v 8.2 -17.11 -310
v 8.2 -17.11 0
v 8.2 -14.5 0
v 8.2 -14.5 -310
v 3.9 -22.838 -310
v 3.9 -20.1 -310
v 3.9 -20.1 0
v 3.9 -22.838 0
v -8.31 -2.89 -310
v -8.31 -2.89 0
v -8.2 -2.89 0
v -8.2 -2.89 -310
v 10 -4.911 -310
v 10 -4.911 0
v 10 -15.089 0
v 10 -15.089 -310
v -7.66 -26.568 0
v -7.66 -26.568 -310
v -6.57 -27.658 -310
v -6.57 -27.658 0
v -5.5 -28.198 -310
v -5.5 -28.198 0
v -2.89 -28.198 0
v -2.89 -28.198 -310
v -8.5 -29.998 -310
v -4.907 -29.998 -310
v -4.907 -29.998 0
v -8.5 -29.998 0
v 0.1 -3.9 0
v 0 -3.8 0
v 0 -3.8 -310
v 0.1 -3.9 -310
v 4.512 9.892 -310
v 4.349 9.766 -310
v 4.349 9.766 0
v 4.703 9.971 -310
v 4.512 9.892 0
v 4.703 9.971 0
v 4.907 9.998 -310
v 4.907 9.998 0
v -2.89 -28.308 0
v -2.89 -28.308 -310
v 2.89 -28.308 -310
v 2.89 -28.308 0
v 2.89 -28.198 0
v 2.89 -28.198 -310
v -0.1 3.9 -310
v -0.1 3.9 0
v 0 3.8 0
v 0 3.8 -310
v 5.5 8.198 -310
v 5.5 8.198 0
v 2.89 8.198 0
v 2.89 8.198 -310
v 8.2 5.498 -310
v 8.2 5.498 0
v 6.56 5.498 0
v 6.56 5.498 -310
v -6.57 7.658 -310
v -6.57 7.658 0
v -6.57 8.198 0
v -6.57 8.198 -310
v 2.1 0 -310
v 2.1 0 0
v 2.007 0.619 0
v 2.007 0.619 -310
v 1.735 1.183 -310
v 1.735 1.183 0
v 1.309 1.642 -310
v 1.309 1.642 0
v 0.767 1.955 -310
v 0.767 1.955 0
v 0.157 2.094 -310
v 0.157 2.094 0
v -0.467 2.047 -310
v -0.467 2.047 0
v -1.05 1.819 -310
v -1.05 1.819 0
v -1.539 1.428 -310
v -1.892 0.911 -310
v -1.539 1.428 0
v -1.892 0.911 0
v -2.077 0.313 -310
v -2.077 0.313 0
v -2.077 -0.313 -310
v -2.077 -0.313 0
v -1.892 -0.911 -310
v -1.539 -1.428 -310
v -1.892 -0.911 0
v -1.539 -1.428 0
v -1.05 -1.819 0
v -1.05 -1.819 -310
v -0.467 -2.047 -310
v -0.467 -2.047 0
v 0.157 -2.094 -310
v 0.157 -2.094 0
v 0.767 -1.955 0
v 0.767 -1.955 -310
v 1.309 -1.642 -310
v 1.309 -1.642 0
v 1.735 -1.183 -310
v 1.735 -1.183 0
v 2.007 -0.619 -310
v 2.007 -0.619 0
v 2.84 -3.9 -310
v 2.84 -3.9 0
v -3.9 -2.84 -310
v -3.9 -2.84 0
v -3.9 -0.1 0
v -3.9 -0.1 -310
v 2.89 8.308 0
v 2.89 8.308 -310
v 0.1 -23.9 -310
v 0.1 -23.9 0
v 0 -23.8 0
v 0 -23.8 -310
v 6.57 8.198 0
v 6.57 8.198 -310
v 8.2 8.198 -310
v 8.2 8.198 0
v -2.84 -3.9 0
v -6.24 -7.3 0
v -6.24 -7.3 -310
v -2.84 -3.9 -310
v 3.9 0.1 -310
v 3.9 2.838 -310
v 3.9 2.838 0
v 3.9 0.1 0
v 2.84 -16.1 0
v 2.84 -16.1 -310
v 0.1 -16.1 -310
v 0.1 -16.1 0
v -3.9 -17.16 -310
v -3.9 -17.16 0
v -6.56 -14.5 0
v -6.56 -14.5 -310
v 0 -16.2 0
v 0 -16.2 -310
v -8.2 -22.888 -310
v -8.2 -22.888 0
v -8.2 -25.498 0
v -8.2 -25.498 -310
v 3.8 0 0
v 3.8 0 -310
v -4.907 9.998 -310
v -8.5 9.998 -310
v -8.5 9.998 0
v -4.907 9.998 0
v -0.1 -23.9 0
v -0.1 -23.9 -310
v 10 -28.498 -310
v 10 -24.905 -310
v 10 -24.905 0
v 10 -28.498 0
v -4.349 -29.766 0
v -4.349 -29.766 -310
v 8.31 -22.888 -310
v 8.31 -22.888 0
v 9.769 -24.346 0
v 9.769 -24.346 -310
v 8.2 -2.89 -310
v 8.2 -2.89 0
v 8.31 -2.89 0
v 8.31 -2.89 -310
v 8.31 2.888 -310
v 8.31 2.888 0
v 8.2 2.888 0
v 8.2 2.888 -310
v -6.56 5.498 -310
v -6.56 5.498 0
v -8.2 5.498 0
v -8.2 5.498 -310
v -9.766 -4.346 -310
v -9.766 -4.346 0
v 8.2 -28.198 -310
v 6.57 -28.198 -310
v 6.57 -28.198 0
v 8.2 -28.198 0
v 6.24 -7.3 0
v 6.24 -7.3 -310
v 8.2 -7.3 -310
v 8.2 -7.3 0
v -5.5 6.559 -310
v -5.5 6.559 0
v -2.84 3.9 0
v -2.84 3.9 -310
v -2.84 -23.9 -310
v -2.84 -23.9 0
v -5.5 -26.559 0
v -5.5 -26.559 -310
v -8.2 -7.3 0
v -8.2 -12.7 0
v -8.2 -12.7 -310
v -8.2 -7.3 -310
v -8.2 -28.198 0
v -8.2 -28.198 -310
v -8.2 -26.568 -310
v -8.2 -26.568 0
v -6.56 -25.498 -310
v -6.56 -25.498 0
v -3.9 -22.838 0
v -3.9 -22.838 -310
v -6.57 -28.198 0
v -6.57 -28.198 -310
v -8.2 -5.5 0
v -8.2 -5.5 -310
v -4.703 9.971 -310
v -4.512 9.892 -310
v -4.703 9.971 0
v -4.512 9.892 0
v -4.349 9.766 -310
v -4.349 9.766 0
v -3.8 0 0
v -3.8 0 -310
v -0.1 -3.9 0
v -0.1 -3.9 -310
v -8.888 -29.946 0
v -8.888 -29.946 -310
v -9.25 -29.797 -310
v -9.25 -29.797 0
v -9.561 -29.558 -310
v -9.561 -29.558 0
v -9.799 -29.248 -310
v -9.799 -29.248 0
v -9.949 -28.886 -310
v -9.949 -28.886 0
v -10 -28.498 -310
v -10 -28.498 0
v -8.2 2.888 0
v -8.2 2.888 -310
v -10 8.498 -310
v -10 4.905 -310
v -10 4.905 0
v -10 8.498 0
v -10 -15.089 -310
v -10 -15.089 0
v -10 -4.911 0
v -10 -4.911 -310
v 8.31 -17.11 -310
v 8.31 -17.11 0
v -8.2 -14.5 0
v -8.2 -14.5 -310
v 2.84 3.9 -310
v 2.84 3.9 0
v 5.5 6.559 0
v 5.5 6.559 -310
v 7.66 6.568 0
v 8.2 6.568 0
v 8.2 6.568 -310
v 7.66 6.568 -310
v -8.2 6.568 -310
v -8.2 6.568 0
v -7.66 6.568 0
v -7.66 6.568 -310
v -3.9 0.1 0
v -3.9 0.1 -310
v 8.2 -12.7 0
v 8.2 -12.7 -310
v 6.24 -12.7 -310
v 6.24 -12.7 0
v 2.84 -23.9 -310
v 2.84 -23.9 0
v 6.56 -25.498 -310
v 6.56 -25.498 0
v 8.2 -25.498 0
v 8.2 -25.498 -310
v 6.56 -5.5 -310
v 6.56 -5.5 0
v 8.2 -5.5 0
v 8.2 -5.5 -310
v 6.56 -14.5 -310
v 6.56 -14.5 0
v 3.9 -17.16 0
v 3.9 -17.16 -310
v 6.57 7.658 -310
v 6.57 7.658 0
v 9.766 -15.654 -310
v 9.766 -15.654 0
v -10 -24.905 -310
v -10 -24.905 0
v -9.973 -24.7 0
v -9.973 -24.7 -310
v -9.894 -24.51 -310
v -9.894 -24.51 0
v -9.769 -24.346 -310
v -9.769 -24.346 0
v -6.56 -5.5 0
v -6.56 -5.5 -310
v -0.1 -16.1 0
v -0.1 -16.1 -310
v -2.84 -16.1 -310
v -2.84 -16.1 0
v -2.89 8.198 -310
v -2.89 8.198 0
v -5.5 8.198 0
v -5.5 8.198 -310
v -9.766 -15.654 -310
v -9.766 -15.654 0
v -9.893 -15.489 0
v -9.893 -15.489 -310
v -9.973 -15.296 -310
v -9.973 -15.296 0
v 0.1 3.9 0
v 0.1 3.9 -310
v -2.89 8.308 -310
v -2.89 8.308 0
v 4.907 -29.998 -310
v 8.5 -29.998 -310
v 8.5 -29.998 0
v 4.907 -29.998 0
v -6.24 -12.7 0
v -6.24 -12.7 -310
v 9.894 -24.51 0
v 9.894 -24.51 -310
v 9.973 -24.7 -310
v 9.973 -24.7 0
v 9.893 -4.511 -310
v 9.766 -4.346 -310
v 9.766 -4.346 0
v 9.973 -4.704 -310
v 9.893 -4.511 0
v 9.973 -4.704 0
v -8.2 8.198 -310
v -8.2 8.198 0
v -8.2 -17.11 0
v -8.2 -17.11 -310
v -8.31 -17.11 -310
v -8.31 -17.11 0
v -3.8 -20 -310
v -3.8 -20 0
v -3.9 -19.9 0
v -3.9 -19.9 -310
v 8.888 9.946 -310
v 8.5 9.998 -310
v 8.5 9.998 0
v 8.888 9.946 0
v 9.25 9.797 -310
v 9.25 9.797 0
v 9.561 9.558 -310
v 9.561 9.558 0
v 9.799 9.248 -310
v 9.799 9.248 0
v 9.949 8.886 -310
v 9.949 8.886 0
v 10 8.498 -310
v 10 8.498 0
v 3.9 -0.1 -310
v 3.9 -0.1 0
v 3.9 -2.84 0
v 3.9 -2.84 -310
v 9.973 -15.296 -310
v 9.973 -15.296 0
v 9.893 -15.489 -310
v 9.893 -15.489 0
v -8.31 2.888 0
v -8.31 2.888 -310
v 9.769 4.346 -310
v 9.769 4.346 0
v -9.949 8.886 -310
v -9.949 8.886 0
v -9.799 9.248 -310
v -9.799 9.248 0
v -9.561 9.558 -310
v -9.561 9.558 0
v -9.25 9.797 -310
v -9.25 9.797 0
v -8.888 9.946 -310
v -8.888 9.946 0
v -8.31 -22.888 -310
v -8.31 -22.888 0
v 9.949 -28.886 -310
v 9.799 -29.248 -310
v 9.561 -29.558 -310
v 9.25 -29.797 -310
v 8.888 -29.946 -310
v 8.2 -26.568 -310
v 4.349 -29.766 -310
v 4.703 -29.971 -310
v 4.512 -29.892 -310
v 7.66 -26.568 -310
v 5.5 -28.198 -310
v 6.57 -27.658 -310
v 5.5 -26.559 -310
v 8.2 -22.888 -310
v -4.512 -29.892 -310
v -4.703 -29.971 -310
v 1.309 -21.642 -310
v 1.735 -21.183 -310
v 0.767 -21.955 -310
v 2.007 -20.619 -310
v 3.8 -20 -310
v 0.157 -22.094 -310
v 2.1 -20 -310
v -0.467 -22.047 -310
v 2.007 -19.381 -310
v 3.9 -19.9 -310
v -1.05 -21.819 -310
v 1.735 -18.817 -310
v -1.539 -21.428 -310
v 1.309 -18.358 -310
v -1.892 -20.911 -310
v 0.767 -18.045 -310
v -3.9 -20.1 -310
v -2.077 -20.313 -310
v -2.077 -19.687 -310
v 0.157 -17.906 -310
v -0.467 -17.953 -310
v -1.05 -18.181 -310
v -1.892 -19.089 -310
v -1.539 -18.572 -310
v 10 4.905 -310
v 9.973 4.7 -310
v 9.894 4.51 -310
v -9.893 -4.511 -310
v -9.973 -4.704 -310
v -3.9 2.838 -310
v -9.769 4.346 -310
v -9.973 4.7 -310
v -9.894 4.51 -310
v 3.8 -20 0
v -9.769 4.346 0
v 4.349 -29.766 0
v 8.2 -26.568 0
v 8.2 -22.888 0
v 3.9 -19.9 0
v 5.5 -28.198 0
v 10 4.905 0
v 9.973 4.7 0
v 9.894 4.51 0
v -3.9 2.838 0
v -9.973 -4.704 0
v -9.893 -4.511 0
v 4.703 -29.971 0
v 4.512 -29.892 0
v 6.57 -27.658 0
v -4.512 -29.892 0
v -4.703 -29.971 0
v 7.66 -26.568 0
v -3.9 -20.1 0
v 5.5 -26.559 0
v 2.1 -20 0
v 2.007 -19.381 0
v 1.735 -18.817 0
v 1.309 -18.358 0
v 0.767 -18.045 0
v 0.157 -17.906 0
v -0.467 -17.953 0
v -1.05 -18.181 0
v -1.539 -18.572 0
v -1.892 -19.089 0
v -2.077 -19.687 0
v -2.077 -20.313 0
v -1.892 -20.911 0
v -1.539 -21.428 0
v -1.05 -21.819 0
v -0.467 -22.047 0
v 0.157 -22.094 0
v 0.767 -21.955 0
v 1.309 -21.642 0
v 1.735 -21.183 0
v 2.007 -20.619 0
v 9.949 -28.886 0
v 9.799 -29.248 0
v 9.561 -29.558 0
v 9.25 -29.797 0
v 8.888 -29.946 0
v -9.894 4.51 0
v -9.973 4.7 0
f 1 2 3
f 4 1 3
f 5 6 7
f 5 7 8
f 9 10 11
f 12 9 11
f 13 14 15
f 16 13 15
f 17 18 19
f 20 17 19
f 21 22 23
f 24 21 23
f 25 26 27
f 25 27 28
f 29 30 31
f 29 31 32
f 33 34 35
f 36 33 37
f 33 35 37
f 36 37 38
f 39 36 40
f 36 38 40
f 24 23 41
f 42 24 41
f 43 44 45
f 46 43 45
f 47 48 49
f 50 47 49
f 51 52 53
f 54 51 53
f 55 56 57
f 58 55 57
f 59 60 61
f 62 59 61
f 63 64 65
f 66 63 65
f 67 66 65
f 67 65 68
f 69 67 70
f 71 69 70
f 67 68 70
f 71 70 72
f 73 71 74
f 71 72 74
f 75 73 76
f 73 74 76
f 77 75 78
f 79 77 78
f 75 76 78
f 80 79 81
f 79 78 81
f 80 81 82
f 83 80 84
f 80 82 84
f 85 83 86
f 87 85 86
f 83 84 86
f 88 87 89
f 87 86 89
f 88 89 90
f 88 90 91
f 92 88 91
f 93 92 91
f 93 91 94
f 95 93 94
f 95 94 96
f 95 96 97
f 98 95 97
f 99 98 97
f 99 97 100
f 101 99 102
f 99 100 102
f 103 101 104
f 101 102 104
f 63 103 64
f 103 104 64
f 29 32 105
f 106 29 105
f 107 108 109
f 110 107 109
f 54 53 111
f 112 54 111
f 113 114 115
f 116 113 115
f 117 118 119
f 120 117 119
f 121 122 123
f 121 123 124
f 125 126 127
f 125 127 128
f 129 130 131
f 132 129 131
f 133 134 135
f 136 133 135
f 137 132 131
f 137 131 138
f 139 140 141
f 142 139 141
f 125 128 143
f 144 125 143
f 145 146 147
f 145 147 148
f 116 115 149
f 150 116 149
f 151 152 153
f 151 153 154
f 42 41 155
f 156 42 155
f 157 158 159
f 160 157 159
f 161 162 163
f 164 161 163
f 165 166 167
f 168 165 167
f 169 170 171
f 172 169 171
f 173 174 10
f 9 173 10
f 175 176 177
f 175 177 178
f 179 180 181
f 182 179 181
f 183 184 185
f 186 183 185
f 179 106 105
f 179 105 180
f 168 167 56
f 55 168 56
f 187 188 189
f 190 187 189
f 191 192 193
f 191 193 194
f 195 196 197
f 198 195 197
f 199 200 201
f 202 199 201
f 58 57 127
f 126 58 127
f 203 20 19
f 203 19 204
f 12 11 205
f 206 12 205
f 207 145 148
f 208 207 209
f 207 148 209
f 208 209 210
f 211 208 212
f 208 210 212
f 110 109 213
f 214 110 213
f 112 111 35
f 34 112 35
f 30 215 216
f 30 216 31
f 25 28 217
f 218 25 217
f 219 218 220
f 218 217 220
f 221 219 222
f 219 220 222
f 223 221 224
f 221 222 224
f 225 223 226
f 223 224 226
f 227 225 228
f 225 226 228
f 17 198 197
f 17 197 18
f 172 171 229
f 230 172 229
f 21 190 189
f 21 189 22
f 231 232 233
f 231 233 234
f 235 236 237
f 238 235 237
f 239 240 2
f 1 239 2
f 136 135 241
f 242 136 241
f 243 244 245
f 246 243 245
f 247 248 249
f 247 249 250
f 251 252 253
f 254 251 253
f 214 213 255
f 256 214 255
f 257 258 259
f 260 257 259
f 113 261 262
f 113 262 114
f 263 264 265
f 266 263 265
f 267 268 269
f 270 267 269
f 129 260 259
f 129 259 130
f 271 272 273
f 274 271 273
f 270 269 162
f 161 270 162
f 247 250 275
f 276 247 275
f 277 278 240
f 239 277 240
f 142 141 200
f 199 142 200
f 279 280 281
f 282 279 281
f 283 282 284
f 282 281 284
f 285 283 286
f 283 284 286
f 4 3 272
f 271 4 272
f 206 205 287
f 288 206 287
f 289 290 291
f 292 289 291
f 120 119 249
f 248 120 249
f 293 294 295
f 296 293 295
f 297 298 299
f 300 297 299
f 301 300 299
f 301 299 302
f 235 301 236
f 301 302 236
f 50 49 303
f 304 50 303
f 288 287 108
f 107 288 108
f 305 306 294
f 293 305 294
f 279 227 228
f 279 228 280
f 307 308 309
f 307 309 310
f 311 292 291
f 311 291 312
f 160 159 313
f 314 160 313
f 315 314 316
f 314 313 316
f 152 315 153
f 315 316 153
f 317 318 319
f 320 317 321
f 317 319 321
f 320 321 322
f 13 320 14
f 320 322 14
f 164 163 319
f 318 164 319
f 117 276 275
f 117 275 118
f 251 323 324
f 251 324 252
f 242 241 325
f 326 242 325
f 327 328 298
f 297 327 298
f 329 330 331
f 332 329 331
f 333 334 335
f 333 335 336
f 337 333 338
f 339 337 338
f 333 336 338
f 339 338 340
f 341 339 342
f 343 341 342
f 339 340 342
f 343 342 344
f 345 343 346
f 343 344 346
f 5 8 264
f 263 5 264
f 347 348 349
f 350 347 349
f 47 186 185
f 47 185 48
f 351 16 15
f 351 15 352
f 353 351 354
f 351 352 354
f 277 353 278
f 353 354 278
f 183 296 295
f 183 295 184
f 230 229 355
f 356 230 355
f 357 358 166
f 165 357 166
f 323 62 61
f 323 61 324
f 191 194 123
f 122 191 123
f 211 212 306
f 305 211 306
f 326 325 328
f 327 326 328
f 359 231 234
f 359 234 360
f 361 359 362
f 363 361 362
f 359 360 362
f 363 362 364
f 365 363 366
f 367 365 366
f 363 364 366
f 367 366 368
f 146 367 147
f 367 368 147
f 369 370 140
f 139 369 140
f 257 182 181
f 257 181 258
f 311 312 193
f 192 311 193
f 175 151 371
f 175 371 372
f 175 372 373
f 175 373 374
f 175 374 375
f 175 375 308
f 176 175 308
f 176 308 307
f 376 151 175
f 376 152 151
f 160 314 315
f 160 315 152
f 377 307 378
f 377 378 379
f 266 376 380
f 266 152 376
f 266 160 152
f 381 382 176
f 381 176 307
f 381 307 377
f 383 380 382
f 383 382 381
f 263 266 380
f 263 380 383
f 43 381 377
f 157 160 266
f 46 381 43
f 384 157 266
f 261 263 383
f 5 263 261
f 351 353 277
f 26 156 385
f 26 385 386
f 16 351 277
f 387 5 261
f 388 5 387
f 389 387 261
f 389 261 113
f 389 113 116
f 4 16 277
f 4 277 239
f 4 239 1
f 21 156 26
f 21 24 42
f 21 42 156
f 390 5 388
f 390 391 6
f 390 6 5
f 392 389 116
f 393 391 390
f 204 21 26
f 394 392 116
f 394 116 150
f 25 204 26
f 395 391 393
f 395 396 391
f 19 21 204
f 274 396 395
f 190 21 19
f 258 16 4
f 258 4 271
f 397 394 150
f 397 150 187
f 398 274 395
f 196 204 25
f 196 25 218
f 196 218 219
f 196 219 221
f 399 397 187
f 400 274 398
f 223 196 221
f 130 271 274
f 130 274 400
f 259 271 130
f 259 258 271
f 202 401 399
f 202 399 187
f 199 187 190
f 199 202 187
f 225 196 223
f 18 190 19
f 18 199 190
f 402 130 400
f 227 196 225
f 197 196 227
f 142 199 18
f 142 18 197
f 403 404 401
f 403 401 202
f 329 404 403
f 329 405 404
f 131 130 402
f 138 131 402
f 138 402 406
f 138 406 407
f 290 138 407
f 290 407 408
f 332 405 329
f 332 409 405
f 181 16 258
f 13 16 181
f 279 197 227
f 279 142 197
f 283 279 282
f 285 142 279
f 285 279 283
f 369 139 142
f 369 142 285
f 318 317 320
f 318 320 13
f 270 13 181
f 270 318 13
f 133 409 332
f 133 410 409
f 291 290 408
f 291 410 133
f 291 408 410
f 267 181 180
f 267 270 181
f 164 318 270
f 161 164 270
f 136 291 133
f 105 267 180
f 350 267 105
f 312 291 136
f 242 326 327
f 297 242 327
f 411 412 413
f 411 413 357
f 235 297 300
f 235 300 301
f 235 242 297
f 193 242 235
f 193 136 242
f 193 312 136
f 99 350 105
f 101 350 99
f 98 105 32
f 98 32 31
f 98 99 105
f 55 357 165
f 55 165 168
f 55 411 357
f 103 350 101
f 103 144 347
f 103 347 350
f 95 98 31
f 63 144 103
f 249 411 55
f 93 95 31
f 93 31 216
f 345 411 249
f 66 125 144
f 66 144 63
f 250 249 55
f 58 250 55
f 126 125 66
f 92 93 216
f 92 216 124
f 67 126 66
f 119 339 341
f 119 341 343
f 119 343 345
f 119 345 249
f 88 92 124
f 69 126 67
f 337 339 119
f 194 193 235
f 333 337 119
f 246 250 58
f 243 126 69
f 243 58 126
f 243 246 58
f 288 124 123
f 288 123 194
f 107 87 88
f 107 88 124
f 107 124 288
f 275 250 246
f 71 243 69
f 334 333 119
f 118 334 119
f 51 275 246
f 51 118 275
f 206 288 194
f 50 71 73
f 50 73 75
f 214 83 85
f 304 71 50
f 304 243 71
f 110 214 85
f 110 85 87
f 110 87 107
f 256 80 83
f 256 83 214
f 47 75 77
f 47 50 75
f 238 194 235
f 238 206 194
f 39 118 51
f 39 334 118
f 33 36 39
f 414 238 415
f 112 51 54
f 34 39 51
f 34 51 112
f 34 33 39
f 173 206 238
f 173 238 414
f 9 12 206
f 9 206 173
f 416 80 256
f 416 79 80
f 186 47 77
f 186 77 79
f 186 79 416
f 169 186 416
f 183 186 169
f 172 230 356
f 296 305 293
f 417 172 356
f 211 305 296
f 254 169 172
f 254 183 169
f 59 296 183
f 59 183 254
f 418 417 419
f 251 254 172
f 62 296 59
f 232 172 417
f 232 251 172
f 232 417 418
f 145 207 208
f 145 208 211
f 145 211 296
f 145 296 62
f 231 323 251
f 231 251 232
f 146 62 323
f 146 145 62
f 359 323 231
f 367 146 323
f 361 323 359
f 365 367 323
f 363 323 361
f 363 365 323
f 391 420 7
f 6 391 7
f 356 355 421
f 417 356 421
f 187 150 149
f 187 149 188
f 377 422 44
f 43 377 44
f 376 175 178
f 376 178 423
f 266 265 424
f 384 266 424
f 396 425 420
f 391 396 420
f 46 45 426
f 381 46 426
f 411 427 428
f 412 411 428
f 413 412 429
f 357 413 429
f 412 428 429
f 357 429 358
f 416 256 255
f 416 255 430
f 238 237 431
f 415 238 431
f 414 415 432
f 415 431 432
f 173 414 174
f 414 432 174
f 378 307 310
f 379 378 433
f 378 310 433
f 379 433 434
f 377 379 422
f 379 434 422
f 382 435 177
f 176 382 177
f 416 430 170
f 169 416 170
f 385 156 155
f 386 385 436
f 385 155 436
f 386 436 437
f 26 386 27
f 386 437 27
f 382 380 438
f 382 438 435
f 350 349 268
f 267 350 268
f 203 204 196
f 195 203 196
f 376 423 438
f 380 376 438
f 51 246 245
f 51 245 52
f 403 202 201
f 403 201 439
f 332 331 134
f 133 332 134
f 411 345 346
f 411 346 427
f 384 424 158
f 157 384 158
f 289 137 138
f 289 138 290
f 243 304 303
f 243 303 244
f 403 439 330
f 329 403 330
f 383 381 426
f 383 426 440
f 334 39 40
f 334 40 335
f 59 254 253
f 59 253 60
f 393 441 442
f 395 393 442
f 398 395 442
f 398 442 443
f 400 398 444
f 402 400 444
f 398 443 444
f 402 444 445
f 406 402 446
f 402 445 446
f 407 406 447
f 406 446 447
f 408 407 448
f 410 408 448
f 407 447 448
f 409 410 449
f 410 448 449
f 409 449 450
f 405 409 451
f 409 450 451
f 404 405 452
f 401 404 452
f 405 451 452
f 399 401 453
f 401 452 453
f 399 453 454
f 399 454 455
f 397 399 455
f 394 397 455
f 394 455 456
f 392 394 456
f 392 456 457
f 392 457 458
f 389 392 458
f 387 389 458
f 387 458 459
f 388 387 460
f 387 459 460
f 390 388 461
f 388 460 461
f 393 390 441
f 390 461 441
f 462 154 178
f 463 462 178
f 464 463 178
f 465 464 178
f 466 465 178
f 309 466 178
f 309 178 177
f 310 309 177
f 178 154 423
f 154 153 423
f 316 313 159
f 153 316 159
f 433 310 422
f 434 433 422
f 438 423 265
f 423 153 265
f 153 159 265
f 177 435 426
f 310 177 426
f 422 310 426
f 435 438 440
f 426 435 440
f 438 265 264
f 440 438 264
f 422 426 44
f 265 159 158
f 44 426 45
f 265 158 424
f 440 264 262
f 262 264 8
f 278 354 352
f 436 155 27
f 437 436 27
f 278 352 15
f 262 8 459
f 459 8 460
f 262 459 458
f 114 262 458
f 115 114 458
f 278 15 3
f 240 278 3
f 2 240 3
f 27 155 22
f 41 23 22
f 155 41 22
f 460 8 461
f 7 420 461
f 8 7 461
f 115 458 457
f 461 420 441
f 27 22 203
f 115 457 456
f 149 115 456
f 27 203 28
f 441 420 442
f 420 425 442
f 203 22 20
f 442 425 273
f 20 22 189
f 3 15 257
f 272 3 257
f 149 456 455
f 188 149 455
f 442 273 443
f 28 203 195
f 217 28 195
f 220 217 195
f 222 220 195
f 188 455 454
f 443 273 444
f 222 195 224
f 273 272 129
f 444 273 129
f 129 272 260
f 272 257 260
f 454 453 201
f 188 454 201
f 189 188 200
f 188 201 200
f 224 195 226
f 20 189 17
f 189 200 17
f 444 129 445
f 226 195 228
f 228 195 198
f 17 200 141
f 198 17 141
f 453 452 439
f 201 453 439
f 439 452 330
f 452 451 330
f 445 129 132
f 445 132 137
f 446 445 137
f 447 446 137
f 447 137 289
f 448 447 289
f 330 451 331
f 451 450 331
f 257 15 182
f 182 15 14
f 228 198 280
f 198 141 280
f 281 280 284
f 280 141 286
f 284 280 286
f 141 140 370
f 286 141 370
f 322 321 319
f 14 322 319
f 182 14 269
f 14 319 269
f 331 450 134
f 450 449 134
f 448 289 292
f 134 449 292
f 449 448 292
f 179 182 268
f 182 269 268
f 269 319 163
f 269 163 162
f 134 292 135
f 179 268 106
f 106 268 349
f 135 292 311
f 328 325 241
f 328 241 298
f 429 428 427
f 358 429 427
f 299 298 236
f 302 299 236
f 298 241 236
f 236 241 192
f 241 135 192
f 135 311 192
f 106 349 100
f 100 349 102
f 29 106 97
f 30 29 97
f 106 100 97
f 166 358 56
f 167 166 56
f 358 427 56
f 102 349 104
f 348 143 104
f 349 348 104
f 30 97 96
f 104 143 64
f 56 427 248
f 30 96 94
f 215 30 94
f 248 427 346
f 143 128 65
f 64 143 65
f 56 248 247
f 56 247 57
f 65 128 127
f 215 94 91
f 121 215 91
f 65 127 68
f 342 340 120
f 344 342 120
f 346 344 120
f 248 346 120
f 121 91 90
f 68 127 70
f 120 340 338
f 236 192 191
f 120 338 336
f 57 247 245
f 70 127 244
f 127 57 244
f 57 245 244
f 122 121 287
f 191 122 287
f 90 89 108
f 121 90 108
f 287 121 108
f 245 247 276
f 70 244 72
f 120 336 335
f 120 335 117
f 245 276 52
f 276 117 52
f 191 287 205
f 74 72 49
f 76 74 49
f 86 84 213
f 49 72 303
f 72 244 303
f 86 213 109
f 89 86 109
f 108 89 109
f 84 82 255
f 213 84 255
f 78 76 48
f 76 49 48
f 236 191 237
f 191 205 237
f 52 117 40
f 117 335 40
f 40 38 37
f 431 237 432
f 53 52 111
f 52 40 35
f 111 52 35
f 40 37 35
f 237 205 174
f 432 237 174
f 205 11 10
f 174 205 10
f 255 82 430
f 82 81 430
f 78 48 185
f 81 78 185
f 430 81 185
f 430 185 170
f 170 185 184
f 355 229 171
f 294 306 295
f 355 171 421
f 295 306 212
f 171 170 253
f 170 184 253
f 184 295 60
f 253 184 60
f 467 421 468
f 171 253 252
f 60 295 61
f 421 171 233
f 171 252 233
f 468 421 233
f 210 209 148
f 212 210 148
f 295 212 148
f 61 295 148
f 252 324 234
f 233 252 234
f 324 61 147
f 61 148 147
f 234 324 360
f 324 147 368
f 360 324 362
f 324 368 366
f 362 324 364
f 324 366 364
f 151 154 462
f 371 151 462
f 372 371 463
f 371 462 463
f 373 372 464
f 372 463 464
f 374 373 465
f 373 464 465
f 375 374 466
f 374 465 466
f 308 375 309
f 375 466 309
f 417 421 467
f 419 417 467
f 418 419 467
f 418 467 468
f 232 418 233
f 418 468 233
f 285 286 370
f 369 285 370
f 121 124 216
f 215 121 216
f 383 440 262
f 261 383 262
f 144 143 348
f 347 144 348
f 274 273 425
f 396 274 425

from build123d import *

# Parameters (mm, degrees)
SKETCH2_R           = 2.1
BOSS_EXTRUDE1_DEPTH = 310


with BuildPart() as part:
    # Sketch2 → Boss-Extrude1 (new body)
    with BuildSketch(Plane.XY):
        with BuildLine():
            Line((-0.1, 3.9), (0, 3.8))
            Line((0, 3.8), (0.1, 3.9))
            Line((0.1, 3.9), (2.840365134, 3.9))
            Line((2.840365134, 3.9), (5.5, 6.558825842))
            Line((5.5, 6.558825842), (5.5, 8.197505675))
            Line((5.5, 8.197505675), (2.89, 8.197505675))
            Line((2.89, 8.197505675), (2.89, 8.307505675))
            Line((2.89, 8.307505675), (4.348614357, 9.766120032))
            ThreePointArc((4.348614357, 9.766120032), (4.604908803, 9.937370505), (4.907228714, 9.997505675))
            Line((4.907228714, 9.997505675), (8.5, 9.997505675))
            ThreePointArc((8.5, 9.997505675), (9.560660172, 9.558165846), (10, 8.497505675))
            Line((10, 8.497505675), (10, 4.904734389))
            ThreePointArc((10, 4.904734389), (9.939864831, 4.602414477), (9.768614357, 4.346120032))
            Line((9.768614357, 4.346120032), (8.31, 2.887505675))
            Line((8.31, 2.887505675), (8.2, 2.887505675))
            Line((8.2, 2.887505675), (8.2, 5.497505675))
            Line((8.2, 5.497505675), (6.56, 5.497505675))
            Line((6.56, 5.497505675), (3.9, 2.83831481))
            Line((3.9, 2.83831481), (3.9, 0.1))
            Line((3.9, 0.1), (3.8, 0))
            Line((3.8, 0), (3.9, -0.1))
            Line((3.9, -0.1), (3.9, -2.84))
            Line((3.9, -2.84), (6.56, -5.5))
            Line((6.56, -5.5), (8.2, -5.5))
            Line((8.2, -5.5), (8.2, -2.89))
            Line((8.2, -2.89), (8.31, -2.89))
            Line((8.31, -2.89), (9.765685425, -4.345685425))
            ThreePointArc((9.765685425, -4.345685425), (9.939103626, -4.605224104), (10, -4.91137085))
            Line((10, -4.91137085), (10, -15.08862915))
            ThreePointArc((10, -15.08862915), (9.939103626, -15.394775896), (9.765685425, -15.654314575))
            Line((9.765685425, -15.654314575), (8.31, -17.11))
            Line((8.31, -17.11), (8.2, -17.11))
            Line((8.2, -17.11), (8.2, -14.5))
            Line((8.2, -14.5), (6.56, -14.5))
            Line((6.56, -14.5), (3.9, -17.16))
            Line((3.9, -17.16), (3.9, -19.9))
            Line((3.9, -19.9), (3.8, -20))
            Line((3.8, -20), (3.9, -20.1))
            Line((3.9, -20.1), (3.9, -22.83831481))
            Line((3.9, -22.83831481), (6.56, -25.497505675))
            Line((6.56, -25.497505675), (8.2, -25.497505675))
            Line((8.2, -25.497505675), (8.2, -22.887505675))
            Line((8.2, -22.887505675), (8.31, -22.887505675))
            Line((8.31, -22.887505675), (9.768614357, -24.346120032))
            ThreePointArc((9.768614357, -24.346120032), (9.939864831, -24.602414477), (10, -24.904734389))
            Line((10, -24.904734389), (10, -28.497505675))
            ThreePointArc((10, -28.497505675), (9.560660172, -29.558165846), (8.5, -29.997505675))
            Line((8.5, -29.997505675), (4.907228714, -29.997505675))
            ThreePointArc((4.907228714, -29.997505675), (4.604908803, -29.937370505), (4.348614357, -29.766120032))
            Line((4.348614357, -29.766120032), (2.89, -28.307505675))
            Line((2.89, -28.307505675), (2.89, -28.197505675))
            Line((2.89, -28.197505675), (5.5, -28.197505675))
            Line((5.5, -28.197505675), (5.5, -26.558825842))
            Line((5.5, -26.558825842), (2.840365134, -23.9))
            Line((2.840365134, -23.9), (0.1, -23.9))
            Line((0.1, -23.9), (0, -23.8))
            Line((0, -23.8), (-0.1, -23.9))
            Line((-0.1, -23.9), (-2.840365134, -23.9))
            Line((-2.840365134, -23.9), (-5.5, -26.558825842))
            Line((-5.5, -26.558825842), (-5.5, -28.197505675))
            Line((-5.5, -28.197505675), (-2.89, -28.197505675))
            Line((-2.89, -28.197505675), (-2.89, -28.307505675))
            Line((-2.89, -28.307505675), (-4.348614357, -29.766120032))
            ThreePointArc((-4.348614357, -29.766120032), (-4.604908803, -29.937370505), (-4.907228714, -29.997505675))
            Line((-4.907228714, -29.997505675), (-8.5, -29.997505675))
            ThreePointArc((-8.5, -29.997505675), (-9.560660172, -29.558165846), (-10, -28.497505675))
            Line((-10, -28.497505675), (-10, -24.904734389))
            ThreePointArc((-10, -24.904734389), (-9.939864831, -24.602414477), (-9.768614357, -24.346120032))
            Line((-9.768614357, -24.346120032), (-8.31, -22.887505675))
            Line((-8.31, -22.887505675), (-8.2, -22.887505675))
            Line((-8.2, -22.887505675), (-8.2, -25.497505675))
            Line((-8.2, -25.497505675), (-6.56, -25.497505675))
            Line((-6.56, -25.497505675), (-3.9, -22.83831481))
            Line((-3.9, -22.83831481), (-3.9, -20.1))
            Line((-3.9, -20.1), (-3.8, -20))
            Line((-3.8, -20), (-3.9, -19.9))
            Line((-3.9, -19.9), (-3.9, -17.16))
            Line((-3.9, -17.16), (-6.56, -14.5))
            Line((-6.56, -14.5), (-8.2, -14.5))
            Line((-8.2, -14.5), (-8.2, -17.11))
            Line((-8.2, -17.11), (-8.31, -17.11))
            Line((-8.31, -17.11), (-9.765685425, -15.654314575))
            ThreePointArc((-9.765685425, -15.654314575), (-9.939103626, -15.394775896), (-10, -15.08862915))
            Line((-10, -15.08862915), (-10, -4.91137085))
            ThreePointArc((-10, -4.91137085), (-9.939103626, -4.605224104), (-9.765685425, -4.345685425))
            Line((-9.765685425, -4.345685425), (-8.31, -2.89))
            Line((-8.31, -2.89), (-8.2, -2.89))
            Line((-8.2, -2.89), (-8.2, -5.5))
            Line((-8.2, -5.5), (-6.56, -5.5))
            Line((-6.56, -5.5), (-3.9, -2.84))
            Line((-3.9, -2.84), (-3.9, -0.1))
            Line((-3.9, -0.1), (-3.8, 0))
            Line((-3.8, 0), (-3.9, 0.1))
            Line((-3.9, 0.1), (-3.9, 2.83831481))
            Line((-3.9, 2.83831481), (-6.56, 5.497505675))
            Line((-6.56, 5.497505675), (-8.2, 5.497505675))
            Line((-8.2, 5.497505675), (-8.2, 2.887505675))
            Line((-8.2, 2.887505675), (-8.31, 2.887505675))
            Line((-8.31, 2.887505675), (-9.768614357, 4.346120032))
            ThreePointArc((-9.768614357, 4.346120032), (-9.939864831, 4.602414477), (-10, 4.904734389))
            Line((-10, 4.904734389), (-10, 8.497505675))
            ThreePointArc((-10, 8.497505675), (-9.560660172, 9.558165846), (-8.5, 9.997505675))
            Line((-8.5, 9.997505675), (-4.907228714, 9.997505675))
            ThreePointArc((-4.907228714, 9.997505675), (-4.604908803, 9.937370505), (-4.348614357, 9.766120032))
            Line((-4.348614357, 9.766120032), (-2.89, 8.307505675))
            Line((-2.89, 8.307505675), (-2.89, 8.197505675))
            Line((-2.89, 8.197505675), (-5.5, 8.197505675))
            Line((-5.5, 8.197505675), (-5.5, 6.558825842))
            Line((-5.5, 6.558825842), (-2.840365134, 3.9))
            Line((-2.840365134, 3.9), (-0.1, 3.9))
        make_face()
        Circle(SKETCH2_R, mode=Mode.SUBTRACT)
        with Locations((0, -20)):
            Circle(SKETCH2_R, mode=Mode.SUBTRACT)
        Polygon((-7.66, 6.567505675), (-6.57, 7.657505675), (-6.57, 8.197505675), (-8.2, 8.197505675), (-8.2, 6.567505675), align=None, mode=Mode.SUBTRACT)
        Polygon((-0.1, -3.9), (0, -3.8), (0.1, -3.9), (2.840365134, -3.9), (6.24, -7.299634866), (8.2, -7.299634866), (8.2, -12.700365134), (6.24, -12.700365134), (2.840365134, -16.1), (0.1, -16.1), (0, -16.2), (-0.1, -16.1), (-2.840365134, -16.1), (-6.24, -12.700365134), (-8.2, -12.700365134), (-8.2, -7.299634866), (-6.24, -7.299634866), (-2.840365134, -3.9), align=None, mode=Mode.SUBTRACT)
        Polygon((8.2, 6.567505675), (7.66, 6.567505675), (6.57, 7.657505675), (6.57, 8.197505675), (8.2, 8.197505675), align=None, mode=Mode.SUBTRACT)
        Polygon((7.66, -26.567505675), (6.57, -27.657505675), (6.57, -28.197505675), (8.2, -28.197505675), (8.2, -26.567505675), align=None, mode=Mode.SUBTRACT)
        Polygon((-8.2, -26.567505675), (-7.66, -26.567505675), (-6.57, -27.657505675), (-6.57, -28.197505675), (-8.2, -28.197505675), align=None, mode=Mode.SUBTRACT)
    extrude(amount=-BOSS_EXTRUDE1_DEPTH)


solid = part.part
